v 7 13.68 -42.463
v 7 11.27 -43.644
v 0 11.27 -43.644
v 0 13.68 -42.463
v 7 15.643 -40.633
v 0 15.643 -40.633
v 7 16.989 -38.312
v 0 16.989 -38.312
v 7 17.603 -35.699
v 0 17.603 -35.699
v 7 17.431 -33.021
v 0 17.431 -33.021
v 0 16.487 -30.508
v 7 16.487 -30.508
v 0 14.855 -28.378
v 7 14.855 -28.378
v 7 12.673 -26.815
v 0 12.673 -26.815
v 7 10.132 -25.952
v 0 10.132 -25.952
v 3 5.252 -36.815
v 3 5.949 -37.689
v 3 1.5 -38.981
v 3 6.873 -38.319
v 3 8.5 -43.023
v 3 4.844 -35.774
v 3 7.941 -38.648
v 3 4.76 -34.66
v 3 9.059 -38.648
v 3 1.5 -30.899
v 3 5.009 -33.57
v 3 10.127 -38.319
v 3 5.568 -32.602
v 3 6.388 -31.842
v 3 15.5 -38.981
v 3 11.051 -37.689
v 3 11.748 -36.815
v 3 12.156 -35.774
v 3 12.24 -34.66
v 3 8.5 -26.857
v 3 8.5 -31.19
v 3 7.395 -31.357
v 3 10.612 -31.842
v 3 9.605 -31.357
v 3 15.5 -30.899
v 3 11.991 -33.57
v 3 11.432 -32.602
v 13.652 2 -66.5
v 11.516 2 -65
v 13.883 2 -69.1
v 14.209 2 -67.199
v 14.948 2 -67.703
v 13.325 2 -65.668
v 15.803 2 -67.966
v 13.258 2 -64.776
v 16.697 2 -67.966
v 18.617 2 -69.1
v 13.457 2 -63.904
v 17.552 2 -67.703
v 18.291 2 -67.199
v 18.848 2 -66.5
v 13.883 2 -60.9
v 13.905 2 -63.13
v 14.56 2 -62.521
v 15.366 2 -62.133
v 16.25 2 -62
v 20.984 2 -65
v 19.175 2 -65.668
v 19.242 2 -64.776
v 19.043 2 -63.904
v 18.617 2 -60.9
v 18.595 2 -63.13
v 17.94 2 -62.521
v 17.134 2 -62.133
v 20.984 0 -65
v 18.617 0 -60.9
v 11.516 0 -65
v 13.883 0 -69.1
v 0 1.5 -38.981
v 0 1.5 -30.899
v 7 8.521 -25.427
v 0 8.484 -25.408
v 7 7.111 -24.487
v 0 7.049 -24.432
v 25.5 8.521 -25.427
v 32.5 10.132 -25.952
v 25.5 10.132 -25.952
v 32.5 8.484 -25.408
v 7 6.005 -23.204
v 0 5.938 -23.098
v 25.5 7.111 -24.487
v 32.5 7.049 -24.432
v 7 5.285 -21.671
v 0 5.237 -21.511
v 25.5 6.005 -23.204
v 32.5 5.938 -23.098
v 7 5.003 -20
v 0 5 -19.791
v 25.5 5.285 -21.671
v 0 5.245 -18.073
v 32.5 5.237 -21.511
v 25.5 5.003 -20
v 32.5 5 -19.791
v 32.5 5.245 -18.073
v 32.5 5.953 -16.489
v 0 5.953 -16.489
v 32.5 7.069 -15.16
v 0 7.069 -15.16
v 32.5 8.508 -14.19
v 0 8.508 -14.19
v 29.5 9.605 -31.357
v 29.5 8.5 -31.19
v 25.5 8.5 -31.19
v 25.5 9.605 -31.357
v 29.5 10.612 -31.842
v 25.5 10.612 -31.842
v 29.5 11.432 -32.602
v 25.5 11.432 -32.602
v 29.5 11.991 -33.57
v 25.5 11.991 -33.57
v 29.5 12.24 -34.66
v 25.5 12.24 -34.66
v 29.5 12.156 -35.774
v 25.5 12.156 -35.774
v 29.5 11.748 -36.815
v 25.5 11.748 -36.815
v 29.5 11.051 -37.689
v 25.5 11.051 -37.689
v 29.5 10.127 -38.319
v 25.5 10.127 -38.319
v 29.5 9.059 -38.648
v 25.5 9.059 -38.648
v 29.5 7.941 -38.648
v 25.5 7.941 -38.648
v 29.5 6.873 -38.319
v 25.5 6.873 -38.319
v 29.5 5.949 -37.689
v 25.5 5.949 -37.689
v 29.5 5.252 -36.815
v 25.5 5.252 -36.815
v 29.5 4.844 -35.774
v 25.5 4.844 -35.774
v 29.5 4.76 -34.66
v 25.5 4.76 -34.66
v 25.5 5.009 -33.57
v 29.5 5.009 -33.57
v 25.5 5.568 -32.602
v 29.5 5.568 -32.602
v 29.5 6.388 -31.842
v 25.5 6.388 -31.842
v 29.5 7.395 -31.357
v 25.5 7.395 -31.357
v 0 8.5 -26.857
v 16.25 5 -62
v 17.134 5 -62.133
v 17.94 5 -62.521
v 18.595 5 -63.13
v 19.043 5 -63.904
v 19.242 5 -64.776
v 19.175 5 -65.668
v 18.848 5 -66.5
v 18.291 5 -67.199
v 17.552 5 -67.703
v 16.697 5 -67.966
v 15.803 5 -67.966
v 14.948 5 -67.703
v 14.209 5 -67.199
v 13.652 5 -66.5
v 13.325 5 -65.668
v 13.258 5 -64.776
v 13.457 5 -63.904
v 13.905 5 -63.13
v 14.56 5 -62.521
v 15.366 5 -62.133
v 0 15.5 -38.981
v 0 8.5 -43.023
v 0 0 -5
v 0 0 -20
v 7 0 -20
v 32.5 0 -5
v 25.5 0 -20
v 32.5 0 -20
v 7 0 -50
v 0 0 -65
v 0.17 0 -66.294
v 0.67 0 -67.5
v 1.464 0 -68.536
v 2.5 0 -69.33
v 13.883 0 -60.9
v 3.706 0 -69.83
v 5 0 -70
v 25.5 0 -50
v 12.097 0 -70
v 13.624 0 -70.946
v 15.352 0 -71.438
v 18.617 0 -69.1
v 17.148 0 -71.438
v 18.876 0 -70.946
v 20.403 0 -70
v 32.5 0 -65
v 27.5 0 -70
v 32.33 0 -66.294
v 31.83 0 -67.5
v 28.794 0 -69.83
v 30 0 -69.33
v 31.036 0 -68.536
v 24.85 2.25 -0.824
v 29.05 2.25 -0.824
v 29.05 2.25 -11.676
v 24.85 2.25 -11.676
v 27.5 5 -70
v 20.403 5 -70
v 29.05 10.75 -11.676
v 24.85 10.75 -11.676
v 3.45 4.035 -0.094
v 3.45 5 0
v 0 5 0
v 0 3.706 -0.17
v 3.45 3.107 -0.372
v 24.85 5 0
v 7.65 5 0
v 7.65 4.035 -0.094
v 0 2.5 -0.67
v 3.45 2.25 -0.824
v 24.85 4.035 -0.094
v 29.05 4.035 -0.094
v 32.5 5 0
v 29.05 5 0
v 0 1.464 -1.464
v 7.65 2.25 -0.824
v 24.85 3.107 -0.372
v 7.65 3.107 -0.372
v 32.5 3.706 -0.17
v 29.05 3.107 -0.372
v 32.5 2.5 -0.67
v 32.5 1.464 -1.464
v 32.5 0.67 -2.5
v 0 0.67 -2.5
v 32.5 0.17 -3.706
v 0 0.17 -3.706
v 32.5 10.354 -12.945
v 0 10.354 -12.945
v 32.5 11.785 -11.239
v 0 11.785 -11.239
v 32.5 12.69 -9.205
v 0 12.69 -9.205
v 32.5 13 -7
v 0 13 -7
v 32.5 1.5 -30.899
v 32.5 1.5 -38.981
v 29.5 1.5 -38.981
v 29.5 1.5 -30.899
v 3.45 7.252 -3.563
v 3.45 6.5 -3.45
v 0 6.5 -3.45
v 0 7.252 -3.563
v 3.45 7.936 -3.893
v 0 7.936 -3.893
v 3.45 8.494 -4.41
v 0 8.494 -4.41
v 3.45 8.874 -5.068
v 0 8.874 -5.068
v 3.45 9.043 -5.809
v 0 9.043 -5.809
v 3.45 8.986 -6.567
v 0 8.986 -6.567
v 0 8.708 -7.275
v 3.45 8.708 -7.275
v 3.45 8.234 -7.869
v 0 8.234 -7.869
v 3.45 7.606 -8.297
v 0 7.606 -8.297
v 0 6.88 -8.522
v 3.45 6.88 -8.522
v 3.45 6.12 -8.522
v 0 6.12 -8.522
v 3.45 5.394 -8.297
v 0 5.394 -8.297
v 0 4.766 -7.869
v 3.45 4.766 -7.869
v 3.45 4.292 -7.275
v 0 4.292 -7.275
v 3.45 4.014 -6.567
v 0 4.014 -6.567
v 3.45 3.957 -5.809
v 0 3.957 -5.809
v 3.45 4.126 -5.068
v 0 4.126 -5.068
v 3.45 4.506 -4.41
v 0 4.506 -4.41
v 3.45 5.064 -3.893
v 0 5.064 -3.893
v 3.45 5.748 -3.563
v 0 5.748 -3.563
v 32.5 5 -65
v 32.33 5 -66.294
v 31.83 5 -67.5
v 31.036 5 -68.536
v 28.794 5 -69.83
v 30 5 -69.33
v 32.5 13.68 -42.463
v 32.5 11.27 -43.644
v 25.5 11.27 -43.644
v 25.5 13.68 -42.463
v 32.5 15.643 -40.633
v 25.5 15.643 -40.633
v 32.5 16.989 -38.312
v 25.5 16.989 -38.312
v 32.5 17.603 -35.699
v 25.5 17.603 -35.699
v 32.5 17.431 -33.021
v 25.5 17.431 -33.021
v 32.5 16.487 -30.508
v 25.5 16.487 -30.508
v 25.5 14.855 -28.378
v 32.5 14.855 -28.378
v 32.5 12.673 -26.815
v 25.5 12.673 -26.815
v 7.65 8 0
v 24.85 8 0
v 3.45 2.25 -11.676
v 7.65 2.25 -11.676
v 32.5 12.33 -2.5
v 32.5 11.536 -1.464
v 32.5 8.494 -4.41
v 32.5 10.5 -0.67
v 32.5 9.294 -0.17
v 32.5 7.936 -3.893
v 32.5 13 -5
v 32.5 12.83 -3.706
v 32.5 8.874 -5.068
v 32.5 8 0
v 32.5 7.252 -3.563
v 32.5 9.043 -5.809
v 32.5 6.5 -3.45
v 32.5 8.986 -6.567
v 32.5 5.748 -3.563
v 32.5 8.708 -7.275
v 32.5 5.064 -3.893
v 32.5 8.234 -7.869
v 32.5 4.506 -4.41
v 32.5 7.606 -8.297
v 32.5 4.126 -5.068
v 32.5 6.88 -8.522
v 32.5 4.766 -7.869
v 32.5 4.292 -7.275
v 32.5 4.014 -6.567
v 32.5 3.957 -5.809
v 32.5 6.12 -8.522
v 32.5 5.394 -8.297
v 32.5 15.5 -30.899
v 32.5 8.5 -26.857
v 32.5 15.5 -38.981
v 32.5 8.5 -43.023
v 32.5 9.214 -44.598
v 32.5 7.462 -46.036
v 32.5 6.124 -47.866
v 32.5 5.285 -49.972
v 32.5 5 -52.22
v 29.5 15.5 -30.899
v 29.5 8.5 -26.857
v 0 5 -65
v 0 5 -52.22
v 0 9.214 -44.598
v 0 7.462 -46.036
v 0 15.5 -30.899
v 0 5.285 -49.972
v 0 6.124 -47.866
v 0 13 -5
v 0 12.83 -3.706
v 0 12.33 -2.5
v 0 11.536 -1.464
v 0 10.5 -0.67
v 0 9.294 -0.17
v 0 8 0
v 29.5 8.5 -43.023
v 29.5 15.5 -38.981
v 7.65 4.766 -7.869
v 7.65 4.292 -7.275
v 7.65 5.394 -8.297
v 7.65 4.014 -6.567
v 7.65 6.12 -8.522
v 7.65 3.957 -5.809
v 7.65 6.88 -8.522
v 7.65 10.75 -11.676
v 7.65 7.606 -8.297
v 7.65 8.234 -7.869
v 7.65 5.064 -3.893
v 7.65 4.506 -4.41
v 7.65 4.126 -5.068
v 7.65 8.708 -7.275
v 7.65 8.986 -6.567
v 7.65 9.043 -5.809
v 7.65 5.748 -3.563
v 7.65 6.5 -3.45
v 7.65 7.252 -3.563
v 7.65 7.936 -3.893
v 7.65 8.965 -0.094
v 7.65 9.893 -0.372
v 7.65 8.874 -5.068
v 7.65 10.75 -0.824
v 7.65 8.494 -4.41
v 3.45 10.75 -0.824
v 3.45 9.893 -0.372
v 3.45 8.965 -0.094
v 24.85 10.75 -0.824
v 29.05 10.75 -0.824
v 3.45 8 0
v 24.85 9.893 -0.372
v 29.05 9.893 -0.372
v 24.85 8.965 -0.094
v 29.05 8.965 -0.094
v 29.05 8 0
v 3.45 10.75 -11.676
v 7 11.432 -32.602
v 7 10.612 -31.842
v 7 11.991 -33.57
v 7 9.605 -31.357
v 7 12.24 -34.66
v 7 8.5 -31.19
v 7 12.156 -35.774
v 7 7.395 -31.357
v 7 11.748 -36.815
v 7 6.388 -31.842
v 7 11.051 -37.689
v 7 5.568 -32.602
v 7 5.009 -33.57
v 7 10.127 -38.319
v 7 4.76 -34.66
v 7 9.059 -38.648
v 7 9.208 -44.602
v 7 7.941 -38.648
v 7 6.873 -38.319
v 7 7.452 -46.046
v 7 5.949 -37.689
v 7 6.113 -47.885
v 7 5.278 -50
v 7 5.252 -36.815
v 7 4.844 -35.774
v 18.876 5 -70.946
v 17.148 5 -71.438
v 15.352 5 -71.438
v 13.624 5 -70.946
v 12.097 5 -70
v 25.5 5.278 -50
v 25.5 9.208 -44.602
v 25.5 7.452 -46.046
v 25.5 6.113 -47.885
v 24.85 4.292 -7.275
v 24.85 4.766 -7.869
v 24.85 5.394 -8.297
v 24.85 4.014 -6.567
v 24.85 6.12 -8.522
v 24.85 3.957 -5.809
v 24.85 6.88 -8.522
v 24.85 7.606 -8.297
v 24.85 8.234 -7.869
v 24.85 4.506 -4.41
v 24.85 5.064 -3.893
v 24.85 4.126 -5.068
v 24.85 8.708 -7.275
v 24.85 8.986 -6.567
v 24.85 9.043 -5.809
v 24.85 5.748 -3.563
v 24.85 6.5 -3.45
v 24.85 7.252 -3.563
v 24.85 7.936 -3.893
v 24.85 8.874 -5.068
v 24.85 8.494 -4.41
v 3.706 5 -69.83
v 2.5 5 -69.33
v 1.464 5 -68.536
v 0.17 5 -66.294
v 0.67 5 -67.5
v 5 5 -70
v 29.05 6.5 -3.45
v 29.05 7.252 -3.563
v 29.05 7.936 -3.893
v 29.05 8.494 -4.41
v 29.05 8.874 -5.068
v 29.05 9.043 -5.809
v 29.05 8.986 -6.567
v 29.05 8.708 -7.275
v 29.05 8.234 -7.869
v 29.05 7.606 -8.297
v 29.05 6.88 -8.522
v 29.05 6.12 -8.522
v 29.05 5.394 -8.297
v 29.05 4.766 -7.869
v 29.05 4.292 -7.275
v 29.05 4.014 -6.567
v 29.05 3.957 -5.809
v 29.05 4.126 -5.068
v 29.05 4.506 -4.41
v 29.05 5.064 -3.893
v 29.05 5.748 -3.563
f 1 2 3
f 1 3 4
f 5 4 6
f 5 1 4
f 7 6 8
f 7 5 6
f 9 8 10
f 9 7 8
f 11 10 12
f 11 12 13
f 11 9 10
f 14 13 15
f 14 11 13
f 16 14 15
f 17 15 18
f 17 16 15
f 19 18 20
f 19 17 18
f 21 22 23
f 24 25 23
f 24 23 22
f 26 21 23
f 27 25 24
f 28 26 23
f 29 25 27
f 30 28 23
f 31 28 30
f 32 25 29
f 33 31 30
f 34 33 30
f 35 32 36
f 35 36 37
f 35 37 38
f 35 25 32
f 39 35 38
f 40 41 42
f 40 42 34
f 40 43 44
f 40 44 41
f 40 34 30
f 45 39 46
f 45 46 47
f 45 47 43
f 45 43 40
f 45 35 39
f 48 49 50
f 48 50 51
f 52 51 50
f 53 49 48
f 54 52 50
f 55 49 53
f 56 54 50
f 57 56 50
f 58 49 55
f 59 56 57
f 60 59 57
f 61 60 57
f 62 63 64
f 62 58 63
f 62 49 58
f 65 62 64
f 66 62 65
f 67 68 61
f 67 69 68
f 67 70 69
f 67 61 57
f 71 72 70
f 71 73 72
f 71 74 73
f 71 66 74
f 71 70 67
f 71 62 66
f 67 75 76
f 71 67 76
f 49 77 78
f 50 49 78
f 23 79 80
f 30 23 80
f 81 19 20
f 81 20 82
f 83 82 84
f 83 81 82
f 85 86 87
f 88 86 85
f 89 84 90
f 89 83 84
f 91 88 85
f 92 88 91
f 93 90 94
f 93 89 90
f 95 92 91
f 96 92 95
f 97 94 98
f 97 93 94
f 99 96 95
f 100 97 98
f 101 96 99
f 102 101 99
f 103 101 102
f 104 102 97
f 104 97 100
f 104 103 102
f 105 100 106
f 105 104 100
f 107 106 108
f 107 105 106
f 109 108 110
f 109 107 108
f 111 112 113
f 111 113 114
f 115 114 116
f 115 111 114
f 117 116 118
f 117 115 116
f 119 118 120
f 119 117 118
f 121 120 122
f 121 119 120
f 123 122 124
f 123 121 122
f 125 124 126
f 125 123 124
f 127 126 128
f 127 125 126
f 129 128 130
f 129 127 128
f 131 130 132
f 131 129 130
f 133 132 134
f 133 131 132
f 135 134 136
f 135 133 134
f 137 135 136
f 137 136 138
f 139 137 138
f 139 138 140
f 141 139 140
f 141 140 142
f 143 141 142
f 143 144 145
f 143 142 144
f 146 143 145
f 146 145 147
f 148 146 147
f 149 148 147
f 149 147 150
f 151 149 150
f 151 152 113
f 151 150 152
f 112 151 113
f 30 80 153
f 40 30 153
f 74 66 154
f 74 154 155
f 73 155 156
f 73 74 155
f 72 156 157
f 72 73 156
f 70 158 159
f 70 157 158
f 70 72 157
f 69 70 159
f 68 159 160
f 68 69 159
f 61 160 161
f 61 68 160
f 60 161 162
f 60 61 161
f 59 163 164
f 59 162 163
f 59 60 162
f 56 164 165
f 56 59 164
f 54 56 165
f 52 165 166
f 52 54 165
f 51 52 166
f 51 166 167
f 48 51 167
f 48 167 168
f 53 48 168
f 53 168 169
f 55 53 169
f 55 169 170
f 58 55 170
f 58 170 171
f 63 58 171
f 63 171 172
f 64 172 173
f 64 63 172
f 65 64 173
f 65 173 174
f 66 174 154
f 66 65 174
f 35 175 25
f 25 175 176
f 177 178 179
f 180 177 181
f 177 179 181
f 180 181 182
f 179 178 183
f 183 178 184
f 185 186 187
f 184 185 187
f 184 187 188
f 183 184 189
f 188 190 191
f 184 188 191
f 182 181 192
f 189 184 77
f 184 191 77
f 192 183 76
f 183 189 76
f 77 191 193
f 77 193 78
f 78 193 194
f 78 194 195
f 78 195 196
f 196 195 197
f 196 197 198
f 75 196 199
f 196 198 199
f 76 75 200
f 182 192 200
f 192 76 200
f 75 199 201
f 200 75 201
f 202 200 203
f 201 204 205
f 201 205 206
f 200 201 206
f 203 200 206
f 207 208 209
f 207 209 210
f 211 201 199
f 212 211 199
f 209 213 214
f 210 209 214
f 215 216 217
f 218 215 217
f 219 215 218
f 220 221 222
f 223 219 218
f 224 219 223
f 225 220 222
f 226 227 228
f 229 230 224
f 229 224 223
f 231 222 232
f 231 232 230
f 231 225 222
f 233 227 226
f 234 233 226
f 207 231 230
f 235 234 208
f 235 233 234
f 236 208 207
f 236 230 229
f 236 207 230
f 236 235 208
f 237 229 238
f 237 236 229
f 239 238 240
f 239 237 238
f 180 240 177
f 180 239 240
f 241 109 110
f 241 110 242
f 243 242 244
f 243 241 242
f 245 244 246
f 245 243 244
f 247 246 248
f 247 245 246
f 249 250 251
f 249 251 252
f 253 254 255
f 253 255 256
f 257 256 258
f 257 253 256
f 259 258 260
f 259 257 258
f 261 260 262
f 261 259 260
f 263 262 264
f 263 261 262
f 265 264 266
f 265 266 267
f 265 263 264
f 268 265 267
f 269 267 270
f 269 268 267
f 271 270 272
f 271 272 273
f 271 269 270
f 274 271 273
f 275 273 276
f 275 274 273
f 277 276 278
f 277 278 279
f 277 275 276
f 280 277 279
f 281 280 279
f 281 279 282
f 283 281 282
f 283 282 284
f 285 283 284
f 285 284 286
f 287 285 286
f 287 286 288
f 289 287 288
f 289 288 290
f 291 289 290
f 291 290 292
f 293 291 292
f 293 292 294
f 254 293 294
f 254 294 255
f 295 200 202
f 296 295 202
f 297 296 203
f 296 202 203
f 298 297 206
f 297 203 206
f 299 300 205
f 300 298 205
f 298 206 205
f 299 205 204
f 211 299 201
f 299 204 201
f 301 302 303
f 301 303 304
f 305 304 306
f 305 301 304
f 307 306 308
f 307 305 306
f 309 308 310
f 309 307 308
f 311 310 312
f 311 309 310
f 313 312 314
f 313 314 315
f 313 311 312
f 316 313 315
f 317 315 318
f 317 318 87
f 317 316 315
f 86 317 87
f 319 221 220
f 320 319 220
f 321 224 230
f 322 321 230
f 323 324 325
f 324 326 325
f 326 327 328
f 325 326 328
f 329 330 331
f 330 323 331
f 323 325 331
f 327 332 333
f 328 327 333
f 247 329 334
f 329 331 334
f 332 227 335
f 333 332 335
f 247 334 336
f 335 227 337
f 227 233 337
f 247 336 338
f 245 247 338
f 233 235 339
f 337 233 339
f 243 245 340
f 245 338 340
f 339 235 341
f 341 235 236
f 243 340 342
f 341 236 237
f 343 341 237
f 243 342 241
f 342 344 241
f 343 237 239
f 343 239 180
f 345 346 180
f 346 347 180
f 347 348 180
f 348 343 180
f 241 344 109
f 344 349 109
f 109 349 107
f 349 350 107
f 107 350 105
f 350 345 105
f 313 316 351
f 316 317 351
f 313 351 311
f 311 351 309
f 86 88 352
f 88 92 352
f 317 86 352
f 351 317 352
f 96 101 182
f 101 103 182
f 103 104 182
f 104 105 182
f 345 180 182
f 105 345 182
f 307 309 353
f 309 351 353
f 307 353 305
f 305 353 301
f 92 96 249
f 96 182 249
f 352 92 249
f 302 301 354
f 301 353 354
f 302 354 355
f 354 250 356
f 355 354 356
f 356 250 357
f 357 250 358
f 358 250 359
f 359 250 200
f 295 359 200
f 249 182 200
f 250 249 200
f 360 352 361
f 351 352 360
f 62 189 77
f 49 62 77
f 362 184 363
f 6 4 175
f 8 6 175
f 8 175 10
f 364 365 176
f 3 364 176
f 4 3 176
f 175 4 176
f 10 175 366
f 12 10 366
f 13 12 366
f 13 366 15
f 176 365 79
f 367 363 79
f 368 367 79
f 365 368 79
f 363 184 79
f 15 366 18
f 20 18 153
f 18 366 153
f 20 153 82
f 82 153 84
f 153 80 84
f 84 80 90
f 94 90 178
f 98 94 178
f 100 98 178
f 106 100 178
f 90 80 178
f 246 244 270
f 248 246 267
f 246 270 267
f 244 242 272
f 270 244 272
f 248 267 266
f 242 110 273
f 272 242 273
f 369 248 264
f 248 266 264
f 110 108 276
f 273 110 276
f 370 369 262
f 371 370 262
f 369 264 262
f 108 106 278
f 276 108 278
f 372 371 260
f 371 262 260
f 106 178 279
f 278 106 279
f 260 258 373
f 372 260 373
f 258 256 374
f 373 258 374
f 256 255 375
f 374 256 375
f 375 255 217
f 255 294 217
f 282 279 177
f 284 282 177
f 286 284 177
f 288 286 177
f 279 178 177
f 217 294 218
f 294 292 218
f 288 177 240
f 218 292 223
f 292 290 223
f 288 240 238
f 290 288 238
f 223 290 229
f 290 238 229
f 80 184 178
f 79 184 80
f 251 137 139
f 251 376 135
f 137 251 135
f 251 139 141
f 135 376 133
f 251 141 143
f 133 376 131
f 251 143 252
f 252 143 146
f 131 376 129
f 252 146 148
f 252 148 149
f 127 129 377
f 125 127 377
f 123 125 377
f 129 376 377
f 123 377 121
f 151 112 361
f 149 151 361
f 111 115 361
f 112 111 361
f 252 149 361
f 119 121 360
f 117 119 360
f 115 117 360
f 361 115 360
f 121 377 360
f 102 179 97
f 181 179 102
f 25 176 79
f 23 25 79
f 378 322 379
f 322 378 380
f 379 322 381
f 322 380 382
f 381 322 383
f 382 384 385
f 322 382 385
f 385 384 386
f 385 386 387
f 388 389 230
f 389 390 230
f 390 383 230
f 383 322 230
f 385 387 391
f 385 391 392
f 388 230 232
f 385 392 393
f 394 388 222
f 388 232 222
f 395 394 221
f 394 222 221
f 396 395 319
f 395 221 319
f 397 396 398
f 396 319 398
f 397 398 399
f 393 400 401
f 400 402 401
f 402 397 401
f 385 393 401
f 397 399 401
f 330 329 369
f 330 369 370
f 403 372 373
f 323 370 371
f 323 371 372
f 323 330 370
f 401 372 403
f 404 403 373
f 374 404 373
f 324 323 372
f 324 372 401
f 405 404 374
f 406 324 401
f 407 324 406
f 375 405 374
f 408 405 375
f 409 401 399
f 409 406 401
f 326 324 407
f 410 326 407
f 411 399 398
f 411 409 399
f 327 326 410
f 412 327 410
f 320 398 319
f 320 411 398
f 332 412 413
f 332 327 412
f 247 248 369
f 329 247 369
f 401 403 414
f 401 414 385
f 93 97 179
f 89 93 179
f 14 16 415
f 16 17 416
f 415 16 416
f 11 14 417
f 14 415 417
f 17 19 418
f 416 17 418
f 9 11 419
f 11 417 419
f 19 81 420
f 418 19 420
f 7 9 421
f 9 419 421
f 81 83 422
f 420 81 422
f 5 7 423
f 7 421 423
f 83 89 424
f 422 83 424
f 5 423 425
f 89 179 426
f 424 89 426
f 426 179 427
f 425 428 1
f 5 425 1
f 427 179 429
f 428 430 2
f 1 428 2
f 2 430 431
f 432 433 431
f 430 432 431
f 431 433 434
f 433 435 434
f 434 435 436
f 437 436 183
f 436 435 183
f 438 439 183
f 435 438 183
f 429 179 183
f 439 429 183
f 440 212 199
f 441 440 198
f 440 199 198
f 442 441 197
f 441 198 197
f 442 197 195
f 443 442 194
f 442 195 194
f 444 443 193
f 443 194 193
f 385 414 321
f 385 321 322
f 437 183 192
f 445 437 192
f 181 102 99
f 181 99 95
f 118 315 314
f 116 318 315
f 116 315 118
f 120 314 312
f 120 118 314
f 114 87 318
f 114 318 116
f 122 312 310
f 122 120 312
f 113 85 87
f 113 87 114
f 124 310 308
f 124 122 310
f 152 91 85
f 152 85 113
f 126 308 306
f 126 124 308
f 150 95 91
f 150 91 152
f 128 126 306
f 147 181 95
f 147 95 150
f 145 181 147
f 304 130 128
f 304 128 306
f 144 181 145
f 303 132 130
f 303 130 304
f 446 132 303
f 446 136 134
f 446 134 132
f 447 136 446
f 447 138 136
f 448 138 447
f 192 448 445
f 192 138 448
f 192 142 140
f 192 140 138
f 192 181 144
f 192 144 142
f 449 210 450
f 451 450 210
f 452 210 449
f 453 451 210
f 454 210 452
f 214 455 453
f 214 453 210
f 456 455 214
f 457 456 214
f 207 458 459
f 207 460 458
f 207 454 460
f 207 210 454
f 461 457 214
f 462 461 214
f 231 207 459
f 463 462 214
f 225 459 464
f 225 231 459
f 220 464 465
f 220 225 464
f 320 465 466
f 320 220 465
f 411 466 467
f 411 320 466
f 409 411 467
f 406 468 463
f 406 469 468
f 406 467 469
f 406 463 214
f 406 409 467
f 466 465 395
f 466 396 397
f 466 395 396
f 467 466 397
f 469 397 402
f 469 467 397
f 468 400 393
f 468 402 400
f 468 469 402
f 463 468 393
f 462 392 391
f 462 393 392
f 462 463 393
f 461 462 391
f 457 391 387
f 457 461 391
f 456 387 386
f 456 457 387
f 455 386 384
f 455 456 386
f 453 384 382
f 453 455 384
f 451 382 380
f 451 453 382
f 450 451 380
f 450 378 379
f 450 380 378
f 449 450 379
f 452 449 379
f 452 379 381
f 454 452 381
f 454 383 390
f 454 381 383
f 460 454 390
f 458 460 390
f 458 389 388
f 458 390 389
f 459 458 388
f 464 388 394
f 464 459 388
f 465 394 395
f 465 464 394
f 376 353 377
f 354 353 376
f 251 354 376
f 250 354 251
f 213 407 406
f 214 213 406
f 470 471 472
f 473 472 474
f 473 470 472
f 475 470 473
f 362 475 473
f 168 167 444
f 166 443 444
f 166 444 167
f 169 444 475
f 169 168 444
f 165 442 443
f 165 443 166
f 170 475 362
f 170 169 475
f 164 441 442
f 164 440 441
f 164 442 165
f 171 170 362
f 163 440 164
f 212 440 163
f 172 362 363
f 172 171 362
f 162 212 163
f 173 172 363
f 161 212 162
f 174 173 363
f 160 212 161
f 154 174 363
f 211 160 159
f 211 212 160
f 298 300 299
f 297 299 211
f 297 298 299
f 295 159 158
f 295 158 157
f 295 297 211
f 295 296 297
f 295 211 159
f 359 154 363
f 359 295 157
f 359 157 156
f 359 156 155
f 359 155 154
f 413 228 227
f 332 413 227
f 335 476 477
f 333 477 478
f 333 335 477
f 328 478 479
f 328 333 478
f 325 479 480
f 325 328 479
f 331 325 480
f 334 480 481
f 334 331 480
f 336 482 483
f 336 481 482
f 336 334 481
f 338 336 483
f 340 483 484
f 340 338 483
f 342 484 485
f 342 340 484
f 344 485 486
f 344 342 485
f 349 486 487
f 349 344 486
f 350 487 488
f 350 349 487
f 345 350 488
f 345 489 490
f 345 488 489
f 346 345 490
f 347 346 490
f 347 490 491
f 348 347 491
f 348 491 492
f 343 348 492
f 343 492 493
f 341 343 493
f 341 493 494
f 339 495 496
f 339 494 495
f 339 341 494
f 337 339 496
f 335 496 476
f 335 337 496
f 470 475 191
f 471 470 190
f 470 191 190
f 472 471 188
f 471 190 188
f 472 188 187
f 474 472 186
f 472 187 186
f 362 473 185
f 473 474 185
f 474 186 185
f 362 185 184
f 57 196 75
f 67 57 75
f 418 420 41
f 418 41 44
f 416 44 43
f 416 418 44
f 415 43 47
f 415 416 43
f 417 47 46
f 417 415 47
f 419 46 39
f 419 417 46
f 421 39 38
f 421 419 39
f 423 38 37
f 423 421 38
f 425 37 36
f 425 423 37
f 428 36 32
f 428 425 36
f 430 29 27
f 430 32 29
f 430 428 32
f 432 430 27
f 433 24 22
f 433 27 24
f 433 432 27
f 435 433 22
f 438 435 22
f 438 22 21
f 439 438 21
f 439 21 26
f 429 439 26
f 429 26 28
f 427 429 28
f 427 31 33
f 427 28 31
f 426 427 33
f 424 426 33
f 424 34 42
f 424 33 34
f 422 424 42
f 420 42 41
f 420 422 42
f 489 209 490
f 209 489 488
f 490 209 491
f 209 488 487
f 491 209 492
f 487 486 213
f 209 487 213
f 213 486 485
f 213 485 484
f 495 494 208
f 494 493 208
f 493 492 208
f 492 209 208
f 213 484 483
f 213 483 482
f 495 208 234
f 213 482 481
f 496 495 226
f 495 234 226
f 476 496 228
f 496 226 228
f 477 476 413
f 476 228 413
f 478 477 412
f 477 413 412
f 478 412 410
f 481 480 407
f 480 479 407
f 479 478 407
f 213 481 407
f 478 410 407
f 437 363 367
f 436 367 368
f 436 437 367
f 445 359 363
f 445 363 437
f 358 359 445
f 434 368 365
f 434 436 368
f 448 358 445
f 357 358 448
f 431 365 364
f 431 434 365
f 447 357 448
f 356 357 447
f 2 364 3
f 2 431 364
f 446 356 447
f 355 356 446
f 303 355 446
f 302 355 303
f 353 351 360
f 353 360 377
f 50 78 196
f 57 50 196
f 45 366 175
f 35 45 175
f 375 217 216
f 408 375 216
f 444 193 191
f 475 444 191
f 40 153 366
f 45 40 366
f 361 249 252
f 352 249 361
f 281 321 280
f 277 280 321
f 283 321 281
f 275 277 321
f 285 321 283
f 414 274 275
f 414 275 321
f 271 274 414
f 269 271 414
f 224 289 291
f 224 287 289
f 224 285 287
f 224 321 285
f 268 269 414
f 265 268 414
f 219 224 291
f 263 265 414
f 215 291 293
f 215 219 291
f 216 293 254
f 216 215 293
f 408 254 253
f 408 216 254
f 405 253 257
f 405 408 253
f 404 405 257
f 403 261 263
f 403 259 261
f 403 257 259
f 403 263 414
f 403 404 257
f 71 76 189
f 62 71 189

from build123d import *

# Parameters (mm, degrees)
SKETCH1_R           = 3
SKETCH1_W           = 18.5
SKETCH1_H           = 30
BOSS_EXTRUDE1_DEPTH = 18.28
SKETCH2_R           = 3.75
SKETCH2_R_2         = 2.55
CUT_EXTRUDE1_DEPTH  = 81.639062495
CUT_EXTRUDE2_DEPTH  = 3
SKETCH4_W           = 4.2
SKETCH4_H           = 8.5
CUT_EXTRUDE3_DEPTH  = 11.67582
CUT_EXTRUDE4_DEPTH  = 2


with BuildPart() as part:
    # Sketch1 → Boss-Extrude1 (new body)
    with BuildSketch(Plane(origin=(0, 0, 0), x_dir=(1, 0, 0), z_dir=(0, 1, 0))):
        with BuildLine():
            Line((0, 0), (32.5, 0))
            Line((32.5, 0), (32.5, 65))
            ThreePointArc((32.5, 65), (31.035533906, 68.535533906), (27.5, 70))
            Line((27.5, 70), (20.403311931, 70))
            ThreePointArc((20.403311931, 70), (16.25, 71.5), (12.096688069, 70))
            Line((12.096688069, 70), (5, 70))
            ThreePointArc((5, 70), (1.464466094, 68.535533906), (0, 65))
            Line((0, 65), (0, 0))
        make_face()
        with Locations((16.25, 65)):
            Circle(SKETCH1_R, mode=Mode.SUBTRACT)
        with Locations((16.25, 35)):
            Rectangle(SKETCH1_W, SKETCH1_H, mode=Mode.SUBTRACT)
    extrude(amount=BOSS_EXTRUDE1_DEPTH)

    # Sketch2 → Cut-Extrude1 (cut, through all)
    with BuildSketch(Plane.ZY):
        with BuildLine():
            Line((-71.5, 18.28), (-71.5, 5))
            Line((-71.5, 5), (-52.220306773, 5))
            ThreePointArc((-52.220306773, 5), (-46.908361498, 6.734792681), (-43.644221508, 11.270391691))
            ThreePointArc((-43.644221508, 11.270391691), (-34.353354824, 17.615612411), (-25.952469379, 10.131819693))
            ThreePointArc((-25.952469379, 10.131819693), (-20.659340597, 5.058687621), (-14.189782649, 8.508137035))
            ThreePointArc((-14.189782649, 8.508137035), (-11.238803116, 11.78472904), (-7, 13))
            Line((-7, 13), (-5, 13))
            ThreePointArc((-5, 13), (-1.464466094, 11.535533906), (0, 8))
            Line((0, 8), (0, 18.28))
            Line((0, 18.28), (-71.5, 18.28))
        make_face()
        with BuildLine():
            ThreePointArc((0, 5), (-1.464466094, 1.464466094), (-5, 0))
            Line((-5, 0), (0, 0))
            Line((0, 0), (0, 5))
        make_face()
        with Locations((-34.94, 8.5)):
            Circle(SKETCH2_R)
        with Locations((-6, 6.5)):
            Circle(SKETCH2_R_2)
    extrude(amount=-CUT_EXTRUDE1_DEPTH, mode=Mode.SUBTRACT)

    # Sketch3 → Cut-Extrude2 (cut)
    with BuildSketch(Plane.ZY):
        Polygon((-26.857096231, 8.5), (-30.898548116, 15.5), (-38.981451884, 15.5), (-43.022903769, 8.5), (-38.981451884, 1.5), (-30.898548116, 1.5), align=None)
    cut_extrude2 = extrude(amount=-CUT_EXTRUDE2_DEPTH, mode=Mode.SUBTRACT)

    # Mirror1: Cut-Extrude2 across plane
    add(cut_extrude2.mirror(Plane.ZY.offset(-16.25)), mode=Mode.SUBTRACT)

    # Sketch4 → Cut-Extrude3 (cut)
    with BuildSketch(Plane.XY):
        with Locations((5.55, 6.5)):
            Rectangle(SKETCH4_W, SKETCH4_H)
    cut_extrude3 = extrude(amount=-CUT_EXTRUDE3_DEPTH, mode=Mode.SUBTRACT)

    # Mirror2: Cut-Extrude3 across plane
    add(cut_extrude3.mirror(Plane.ZY.offset(-16.25)), mode=Mode.SUBTRACT)

    # Sketch5 → Cut-Extrude4 (cut)
    with BuildSketch(Plane.XZ):
        Polygon((11.515727793, -65), (13.882863896, -69.1), (18.617136104, -69.1), (20.984272207, -65), (18.617136104, -60.9), (13.882863896, -60.9), align=None)
    extrude(amount=-CUT_EXTRUDE4_DEPTH, mode=Mode.SUBTRACT)


solid = part.part
